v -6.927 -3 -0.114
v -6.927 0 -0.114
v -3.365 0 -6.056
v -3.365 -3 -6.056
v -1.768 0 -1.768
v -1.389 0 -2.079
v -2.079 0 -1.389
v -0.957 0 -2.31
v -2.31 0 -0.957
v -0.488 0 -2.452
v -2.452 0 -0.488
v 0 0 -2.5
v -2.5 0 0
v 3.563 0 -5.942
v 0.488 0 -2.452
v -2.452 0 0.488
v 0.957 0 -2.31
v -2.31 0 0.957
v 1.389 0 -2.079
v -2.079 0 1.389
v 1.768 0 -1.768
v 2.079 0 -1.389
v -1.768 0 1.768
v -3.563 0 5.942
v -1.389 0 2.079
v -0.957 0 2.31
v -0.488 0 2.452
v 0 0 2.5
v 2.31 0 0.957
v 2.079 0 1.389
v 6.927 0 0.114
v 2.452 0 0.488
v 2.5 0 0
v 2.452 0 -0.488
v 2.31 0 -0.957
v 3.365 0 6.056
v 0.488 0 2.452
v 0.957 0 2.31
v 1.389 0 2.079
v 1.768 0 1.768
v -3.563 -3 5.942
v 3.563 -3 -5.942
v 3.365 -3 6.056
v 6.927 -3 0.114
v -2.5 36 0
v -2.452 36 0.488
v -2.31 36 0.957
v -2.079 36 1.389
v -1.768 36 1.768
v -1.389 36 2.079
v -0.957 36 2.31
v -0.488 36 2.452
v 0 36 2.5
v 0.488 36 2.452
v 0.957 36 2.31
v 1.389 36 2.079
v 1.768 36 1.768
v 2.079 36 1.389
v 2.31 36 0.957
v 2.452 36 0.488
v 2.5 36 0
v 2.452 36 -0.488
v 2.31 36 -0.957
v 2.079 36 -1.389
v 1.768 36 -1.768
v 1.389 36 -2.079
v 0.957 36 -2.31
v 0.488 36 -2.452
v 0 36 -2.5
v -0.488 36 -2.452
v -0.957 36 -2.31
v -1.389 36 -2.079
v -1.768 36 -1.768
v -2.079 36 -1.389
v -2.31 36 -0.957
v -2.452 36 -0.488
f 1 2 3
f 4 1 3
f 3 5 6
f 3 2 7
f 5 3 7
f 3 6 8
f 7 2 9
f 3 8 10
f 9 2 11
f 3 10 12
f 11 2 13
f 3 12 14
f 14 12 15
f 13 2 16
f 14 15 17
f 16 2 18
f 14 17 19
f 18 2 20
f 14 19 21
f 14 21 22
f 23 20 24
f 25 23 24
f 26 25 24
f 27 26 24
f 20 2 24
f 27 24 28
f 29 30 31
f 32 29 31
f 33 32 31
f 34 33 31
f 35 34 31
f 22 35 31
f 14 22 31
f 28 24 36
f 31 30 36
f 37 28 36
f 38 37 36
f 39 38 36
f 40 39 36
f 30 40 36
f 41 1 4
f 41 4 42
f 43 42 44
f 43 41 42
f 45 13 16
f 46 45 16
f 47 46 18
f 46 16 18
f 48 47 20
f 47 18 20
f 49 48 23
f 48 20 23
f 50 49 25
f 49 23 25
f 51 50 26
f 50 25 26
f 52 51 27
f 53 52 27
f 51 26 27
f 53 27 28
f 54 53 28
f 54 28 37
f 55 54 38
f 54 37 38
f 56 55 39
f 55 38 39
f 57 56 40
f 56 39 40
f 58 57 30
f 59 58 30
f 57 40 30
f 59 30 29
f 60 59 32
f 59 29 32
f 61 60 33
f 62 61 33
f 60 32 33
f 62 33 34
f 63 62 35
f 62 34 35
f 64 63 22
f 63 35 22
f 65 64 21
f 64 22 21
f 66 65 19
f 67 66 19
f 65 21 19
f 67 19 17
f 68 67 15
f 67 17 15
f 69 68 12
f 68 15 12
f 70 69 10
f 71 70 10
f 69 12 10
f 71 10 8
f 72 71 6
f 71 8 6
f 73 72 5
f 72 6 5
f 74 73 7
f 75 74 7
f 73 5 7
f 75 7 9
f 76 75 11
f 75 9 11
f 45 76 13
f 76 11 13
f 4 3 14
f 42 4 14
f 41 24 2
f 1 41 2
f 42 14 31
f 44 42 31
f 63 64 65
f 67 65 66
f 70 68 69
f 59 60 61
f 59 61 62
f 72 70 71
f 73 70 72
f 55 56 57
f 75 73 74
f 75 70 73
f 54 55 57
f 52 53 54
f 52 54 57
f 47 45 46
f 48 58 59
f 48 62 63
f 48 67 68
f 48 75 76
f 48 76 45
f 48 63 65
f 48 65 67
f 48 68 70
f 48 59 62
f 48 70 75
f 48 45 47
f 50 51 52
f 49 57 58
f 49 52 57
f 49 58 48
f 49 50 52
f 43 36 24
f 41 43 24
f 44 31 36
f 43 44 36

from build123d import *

# Parameters (mm, degrees)
F1_DEPTH = 3
F2_R     = 2.5
F3_DEPTH = 36


with BuildPart() as f1:
    # F0 (on Front) → F1 (new body)
    with BuildSketch(Plane.XZ):
        Polygon((-3.562627, 5.942027), (-6.92726, -0.114312), (-3.364633, -6.056339), (3.562627, -5.942027), (6.92726, 0.114312), (3.364633, 6.056339), align=None)
    extrude(amount=F1_DEPTH)

    # F2 (on face) → F3 (join)
    with BuildSketch(Plane(origin=(0, 0, 0), x_dir=(-1, 0, 0), z_dir=(0, 1, 0))):
        Circle(F2_R)
    extrude(amount=F3_DEPTH)


solid = f1.part
